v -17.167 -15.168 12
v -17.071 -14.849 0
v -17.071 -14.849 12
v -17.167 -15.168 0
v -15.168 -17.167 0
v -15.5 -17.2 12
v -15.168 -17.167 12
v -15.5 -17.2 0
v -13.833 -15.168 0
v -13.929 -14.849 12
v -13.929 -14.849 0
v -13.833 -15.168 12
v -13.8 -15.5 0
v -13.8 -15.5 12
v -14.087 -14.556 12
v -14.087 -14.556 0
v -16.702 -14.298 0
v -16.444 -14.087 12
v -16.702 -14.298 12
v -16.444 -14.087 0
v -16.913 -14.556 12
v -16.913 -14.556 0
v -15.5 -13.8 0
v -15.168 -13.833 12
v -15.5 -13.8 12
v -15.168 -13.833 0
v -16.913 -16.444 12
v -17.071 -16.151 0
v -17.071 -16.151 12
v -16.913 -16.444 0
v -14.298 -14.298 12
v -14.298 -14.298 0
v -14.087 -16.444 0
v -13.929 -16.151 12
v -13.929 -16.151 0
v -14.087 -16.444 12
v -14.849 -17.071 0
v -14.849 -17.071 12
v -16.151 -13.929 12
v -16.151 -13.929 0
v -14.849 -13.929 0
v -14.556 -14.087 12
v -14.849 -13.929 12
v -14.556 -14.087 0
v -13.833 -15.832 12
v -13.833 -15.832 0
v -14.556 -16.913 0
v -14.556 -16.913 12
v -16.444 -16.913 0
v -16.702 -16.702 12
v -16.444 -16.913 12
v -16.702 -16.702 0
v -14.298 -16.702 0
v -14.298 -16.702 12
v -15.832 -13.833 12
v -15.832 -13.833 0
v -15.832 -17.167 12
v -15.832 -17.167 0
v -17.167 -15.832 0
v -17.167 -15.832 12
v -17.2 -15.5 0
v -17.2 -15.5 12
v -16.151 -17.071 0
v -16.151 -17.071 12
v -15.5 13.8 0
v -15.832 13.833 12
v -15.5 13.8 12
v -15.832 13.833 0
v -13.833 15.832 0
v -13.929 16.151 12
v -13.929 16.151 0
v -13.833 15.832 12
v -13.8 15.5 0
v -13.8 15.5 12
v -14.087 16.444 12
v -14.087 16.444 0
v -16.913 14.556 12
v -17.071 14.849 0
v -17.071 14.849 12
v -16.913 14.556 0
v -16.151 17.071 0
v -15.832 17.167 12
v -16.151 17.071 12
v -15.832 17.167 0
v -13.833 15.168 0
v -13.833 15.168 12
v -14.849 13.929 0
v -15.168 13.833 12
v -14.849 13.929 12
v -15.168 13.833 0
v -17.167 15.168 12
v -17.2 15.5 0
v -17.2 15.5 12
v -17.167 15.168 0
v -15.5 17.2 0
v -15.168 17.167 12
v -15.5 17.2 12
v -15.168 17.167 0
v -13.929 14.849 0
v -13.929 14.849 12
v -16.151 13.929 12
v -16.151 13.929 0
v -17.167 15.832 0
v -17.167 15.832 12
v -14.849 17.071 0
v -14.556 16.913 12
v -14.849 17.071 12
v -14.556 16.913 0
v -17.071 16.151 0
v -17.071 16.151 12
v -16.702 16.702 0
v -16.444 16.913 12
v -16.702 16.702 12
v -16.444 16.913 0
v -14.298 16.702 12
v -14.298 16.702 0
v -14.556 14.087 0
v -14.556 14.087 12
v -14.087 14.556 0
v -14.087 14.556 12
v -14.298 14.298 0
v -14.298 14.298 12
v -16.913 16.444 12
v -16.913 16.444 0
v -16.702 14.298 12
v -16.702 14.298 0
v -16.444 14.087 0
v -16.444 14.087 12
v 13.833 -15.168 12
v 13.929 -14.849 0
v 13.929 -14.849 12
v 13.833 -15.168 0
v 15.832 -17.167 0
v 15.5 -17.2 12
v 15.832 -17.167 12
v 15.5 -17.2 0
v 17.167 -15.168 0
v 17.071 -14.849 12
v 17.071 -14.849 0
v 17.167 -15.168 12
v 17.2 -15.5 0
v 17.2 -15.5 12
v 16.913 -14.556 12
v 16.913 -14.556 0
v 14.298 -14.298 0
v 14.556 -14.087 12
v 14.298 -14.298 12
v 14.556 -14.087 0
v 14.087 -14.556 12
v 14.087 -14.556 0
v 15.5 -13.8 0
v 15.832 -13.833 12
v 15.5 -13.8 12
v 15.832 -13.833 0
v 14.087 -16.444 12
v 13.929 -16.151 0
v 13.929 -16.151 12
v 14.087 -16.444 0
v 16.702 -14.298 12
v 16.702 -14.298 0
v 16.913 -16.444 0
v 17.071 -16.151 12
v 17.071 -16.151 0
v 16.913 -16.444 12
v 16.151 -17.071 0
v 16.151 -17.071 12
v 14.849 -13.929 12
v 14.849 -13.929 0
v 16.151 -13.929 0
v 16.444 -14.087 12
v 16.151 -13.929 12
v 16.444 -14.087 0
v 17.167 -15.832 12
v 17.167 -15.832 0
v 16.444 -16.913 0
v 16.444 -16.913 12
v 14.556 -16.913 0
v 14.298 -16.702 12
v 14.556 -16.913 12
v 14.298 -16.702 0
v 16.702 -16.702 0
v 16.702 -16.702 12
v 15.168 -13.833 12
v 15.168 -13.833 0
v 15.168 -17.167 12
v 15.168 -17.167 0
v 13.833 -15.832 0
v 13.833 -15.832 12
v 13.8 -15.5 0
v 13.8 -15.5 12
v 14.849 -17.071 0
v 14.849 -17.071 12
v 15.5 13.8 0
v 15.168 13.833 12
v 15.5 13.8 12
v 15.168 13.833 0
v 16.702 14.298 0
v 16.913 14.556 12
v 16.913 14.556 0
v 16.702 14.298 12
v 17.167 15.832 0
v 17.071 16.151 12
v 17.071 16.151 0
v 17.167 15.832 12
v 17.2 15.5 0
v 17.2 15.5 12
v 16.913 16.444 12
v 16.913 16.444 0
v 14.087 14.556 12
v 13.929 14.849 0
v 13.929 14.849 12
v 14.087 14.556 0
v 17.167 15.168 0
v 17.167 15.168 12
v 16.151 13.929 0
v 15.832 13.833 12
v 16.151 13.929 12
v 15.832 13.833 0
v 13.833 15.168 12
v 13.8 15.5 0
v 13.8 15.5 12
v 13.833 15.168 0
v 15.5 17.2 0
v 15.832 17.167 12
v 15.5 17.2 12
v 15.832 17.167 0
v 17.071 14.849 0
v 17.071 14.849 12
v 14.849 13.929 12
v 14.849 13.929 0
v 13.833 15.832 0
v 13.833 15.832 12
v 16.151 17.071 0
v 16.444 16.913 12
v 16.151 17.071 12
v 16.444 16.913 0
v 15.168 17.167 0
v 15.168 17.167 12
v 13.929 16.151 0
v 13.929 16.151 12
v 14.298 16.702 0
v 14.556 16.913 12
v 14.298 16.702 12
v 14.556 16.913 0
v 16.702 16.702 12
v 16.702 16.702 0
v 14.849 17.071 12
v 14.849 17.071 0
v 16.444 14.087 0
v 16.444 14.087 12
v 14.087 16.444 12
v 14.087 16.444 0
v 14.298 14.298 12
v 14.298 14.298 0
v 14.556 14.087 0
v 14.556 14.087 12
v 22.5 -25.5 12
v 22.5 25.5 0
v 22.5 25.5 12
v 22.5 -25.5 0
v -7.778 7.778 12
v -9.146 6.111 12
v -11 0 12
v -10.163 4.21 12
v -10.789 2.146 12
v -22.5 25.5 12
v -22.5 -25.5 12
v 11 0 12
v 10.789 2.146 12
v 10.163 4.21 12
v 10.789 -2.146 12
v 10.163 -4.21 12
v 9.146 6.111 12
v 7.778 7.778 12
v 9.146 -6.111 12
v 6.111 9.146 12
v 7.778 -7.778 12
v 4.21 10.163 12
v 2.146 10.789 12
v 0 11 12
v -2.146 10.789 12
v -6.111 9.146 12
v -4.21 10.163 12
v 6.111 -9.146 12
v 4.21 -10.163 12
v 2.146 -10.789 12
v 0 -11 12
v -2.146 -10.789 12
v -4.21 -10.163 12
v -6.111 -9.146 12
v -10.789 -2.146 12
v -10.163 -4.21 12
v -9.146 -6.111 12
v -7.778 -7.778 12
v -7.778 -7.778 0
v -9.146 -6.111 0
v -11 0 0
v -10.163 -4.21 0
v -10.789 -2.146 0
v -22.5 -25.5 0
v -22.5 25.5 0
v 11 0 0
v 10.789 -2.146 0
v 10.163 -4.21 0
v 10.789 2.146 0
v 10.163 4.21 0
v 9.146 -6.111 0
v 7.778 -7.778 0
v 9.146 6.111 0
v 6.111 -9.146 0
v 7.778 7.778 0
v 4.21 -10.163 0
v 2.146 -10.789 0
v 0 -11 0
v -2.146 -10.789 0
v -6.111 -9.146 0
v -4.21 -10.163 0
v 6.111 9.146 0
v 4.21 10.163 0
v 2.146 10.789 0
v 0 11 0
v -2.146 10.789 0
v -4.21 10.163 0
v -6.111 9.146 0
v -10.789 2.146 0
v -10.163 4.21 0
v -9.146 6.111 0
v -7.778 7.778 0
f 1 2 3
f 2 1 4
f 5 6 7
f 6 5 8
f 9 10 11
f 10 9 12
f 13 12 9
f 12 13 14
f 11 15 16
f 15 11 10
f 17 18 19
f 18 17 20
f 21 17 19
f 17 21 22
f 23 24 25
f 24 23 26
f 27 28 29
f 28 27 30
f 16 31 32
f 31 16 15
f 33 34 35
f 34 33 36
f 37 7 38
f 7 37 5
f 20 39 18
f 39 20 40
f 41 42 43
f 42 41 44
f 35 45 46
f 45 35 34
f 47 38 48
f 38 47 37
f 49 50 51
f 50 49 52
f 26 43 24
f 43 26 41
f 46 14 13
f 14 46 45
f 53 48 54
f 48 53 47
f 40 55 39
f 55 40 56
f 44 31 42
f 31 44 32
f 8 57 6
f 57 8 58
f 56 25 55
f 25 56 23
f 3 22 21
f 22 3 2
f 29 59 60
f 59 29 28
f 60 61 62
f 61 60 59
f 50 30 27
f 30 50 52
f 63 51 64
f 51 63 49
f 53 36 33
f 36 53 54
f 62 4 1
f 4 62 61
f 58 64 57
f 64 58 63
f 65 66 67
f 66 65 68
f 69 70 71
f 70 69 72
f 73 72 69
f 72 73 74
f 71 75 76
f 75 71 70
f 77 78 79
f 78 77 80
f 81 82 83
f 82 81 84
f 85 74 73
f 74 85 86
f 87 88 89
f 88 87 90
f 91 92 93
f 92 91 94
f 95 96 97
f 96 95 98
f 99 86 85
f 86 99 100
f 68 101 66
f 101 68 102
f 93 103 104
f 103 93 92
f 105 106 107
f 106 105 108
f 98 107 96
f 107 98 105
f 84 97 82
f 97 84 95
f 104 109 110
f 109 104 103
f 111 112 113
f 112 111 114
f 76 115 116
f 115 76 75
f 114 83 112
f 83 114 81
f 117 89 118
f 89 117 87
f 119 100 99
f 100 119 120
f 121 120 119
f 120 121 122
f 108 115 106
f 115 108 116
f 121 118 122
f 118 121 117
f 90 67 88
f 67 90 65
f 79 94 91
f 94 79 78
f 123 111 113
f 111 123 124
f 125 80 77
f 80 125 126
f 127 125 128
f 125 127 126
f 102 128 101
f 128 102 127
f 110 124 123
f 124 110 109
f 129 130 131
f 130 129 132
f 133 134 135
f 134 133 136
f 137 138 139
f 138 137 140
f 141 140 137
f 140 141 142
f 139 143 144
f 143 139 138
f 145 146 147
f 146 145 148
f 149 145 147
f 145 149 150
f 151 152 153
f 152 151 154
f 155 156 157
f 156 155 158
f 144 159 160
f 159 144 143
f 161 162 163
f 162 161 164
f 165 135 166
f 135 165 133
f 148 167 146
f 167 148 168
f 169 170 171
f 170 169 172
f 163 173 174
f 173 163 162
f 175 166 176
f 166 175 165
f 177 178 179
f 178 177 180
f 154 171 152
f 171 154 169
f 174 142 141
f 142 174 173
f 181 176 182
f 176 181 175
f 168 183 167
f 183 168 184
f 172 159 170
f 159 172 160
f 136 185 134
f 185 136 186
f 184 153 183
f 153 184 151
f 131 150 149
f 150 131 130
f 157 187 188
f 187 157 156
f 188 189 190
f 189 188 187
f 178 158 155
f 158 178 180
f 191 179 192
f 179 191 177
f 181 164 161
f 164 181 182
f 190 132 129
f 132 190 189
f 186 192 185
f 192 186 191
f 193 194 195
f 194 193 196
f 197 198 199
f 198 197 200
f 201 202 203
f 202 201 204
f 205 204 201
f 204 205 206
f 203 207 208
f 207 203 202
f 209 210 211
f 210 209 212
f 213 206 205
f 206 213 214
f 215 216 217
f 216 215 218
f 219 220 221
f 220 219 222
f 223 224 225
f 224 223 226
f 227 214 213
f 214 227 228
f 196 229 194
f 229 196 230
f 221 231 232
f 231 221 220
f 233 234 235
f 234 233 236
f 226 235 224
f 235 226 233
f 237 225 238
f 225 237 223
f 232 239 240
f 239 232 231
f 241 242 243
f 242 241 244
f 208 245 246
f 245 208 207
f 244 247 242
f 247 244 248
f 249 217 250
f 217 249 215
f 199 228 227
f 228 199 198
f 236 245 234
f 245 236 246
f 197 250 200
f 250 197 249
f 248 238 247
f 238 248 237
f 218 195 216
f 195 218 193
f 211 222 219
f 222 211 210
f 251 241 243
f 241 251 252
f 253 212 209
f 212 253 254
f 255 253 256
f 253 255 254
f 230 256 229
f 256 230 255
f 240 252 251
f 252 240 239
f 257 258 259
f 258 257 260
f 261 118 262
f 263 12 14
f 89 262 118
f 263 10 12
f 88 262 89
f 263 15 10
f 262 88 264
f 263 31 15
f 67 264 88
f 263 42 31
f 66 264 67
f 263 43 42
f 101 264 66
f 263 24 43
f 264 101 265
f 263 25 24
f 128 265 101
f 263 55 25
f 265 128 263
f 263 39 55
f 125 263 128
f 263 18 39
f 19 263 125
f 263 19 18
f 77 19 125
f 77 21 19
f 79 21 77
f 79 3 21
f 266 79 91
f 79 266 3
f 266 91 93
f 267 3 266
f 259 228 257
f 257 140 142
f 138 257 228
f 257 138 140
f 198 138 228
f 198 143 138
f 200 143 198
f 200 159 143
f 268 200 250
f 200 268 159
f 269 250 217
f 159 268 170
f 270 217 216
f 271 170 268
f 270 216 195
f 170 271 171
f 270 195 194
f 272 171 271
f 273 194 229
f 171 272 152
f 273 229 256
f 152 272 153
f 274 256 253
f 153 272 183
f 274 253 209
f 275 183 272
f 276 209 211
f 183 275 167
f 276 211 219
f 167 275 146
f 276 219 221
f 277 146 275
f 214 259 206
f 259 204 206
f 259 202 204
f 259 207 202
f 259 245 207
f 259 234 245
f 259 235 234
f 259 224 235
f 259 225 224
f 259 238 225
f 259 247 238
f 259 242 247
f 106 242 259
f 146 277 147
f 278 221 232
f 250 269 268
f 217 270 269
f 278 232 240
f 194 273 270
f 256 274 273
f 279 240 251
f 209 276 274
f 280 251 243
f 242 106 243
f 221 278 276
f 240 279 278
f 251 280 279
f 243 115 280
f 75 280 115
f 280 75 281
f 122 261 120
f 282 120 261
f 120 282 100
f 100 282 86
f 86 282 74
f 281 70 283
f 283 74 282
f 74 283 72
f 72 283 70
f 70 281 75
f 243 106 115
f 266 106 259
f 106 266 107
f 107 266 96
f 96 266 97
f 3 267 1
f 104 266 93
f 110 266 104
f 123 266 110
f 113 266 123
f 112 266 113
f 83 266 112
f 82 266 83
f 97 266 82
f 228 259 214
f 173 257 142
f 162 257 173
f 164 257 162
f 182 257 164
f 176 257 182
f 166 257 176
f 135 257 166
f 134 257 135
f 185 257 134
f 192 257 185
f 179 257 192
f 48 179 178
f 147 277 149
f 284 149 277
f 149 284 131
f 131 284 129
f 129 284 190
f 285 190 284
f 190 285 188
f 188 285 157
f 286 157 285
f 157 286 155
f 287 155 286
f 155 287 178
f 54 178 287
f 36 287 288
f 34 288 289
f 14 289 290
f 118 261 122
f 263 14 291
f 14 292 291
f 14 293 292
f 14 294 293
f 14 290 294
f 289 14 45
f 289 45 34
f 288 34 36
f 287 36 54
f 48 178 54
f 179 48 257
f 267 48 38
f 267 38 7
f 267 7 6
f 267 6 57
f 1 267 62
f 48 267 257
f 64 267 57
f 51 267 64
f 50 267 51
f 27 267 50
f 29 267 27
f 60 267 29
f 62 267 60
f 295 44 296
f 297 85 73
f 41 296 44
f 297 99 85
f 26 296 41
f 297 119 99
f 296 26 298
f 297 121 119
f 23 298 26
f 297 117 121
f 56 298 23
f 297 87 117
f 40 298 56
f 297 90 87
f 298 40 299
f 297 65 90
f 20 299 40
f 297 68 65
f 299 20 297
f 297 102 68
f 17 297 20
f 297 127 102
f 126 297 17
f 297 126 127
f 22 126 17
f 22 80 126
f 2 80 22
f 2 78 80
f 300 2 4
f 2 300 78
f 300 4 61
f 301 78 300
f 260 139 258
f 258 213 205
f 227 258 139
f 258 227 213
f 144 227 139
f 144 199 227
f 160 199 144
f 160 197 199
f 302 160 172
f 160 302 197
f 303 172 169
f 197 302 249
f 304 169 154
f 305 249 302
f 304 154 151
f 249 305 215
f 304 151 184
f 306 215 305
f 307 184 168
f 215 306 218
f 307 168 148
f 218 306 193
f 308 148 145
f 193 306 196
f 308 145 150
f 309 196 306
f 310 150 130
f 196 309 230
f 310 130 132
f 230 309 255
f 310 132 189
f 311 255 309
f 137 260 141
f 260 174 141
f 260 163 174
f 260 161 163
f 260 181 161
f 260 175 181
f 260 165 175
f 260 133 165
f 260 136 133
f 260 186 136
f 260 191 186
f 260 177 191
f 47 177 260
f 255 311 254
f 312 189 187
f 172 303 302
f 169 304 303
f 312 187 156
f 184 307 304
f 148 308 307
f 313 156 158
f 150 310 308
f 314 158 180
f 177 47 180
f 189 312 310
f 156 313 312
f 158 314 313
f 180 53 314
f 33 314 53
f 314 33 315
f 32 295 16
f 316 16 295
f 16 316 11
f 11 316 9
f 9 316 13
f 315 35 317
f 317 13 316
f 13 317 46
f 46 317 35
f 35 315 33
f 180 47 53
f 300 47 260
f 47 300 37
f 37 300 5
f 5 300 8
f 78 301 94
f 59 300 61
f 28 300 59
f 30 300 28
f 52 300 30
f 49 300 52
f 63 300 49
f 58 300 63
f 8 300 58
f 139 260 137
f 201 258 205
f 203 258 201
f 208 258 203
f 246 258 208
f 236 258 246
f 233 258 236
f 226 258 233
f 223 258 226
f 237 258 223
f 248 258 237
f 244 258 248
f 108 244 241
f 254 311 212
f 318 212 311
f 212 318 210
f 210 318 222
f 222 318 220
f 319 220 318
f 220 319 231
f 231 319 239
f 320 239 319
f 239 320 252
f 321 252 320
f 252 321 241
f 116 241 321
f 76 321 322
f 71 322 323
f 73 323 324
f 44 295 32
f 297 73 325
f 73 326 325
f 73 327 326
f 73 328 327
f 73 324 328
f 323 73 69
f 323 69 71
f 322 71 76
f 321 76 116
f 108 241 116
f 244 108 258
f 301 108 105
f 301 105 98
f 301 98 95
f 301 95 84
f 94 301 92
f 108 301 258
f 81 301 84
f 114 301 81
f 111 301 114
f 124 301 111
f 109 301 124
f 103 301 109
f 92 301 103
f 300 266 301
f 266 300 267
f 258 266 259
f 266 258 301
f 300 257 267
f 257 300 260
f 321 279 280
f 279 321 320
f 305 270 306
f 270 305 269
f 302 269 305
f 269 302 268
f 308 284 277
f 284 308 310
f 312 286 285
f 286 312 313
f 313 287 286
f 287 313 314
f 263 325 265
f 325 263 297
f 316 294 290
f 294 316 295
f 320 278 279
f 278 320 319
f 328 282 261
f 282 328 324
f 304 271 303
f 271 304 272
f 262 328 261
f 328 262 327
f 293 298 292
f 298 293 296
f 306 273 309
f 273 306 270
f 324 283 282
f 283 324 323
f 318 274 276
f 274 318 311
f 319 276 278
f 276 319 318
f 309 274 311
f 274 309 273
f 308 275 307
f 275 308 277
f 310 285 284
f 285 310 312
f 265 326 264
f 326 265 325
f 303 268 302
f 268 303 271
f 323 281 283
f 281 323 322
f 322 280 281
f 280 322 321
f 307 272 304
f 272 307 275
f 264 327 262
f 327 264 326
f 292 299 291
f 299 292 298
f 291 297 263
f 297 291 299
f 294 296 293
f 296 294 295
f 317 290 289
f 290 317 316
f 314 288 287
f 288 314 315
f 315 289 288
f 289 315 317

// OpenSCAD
$fn = 32;

// ----------------------------------------------------------------------
// Motor mount plate: NEMA17, 45 x 51 x 12 mm
// ----------------------------------------------------------------------

// --- parameters (mm) ---
base_x = 45;              // plate length, X
base_y = 51;              // plate width, Y
thick = 12;               // plate thickness
bolt_pitch = 31;          // NEMA17 bolt spacing
motor_d = 3.4;            // NEMA17 screw clearance
boss_hole = 22;           // pilot boss bore

module plate() {
  translate([-base_x / 2, -base_y / 2, 0]) cube([base_x, base_y, thick]);
}

module motor_holes() {
  for (sx = [-1, 1]) for (sy = [-1, 1])
    translate([sx * bolt_pitch / 2, sy * bolt_pitch / 2, -1])
      cylinder(h = thick + 2, d = motor_d);
}

difference() {
  union() {
    plate();
  }
  motor_holes();
  translate([0, 0, -1]) cylinder(h = thick + 2, d = boss_hole);
}
